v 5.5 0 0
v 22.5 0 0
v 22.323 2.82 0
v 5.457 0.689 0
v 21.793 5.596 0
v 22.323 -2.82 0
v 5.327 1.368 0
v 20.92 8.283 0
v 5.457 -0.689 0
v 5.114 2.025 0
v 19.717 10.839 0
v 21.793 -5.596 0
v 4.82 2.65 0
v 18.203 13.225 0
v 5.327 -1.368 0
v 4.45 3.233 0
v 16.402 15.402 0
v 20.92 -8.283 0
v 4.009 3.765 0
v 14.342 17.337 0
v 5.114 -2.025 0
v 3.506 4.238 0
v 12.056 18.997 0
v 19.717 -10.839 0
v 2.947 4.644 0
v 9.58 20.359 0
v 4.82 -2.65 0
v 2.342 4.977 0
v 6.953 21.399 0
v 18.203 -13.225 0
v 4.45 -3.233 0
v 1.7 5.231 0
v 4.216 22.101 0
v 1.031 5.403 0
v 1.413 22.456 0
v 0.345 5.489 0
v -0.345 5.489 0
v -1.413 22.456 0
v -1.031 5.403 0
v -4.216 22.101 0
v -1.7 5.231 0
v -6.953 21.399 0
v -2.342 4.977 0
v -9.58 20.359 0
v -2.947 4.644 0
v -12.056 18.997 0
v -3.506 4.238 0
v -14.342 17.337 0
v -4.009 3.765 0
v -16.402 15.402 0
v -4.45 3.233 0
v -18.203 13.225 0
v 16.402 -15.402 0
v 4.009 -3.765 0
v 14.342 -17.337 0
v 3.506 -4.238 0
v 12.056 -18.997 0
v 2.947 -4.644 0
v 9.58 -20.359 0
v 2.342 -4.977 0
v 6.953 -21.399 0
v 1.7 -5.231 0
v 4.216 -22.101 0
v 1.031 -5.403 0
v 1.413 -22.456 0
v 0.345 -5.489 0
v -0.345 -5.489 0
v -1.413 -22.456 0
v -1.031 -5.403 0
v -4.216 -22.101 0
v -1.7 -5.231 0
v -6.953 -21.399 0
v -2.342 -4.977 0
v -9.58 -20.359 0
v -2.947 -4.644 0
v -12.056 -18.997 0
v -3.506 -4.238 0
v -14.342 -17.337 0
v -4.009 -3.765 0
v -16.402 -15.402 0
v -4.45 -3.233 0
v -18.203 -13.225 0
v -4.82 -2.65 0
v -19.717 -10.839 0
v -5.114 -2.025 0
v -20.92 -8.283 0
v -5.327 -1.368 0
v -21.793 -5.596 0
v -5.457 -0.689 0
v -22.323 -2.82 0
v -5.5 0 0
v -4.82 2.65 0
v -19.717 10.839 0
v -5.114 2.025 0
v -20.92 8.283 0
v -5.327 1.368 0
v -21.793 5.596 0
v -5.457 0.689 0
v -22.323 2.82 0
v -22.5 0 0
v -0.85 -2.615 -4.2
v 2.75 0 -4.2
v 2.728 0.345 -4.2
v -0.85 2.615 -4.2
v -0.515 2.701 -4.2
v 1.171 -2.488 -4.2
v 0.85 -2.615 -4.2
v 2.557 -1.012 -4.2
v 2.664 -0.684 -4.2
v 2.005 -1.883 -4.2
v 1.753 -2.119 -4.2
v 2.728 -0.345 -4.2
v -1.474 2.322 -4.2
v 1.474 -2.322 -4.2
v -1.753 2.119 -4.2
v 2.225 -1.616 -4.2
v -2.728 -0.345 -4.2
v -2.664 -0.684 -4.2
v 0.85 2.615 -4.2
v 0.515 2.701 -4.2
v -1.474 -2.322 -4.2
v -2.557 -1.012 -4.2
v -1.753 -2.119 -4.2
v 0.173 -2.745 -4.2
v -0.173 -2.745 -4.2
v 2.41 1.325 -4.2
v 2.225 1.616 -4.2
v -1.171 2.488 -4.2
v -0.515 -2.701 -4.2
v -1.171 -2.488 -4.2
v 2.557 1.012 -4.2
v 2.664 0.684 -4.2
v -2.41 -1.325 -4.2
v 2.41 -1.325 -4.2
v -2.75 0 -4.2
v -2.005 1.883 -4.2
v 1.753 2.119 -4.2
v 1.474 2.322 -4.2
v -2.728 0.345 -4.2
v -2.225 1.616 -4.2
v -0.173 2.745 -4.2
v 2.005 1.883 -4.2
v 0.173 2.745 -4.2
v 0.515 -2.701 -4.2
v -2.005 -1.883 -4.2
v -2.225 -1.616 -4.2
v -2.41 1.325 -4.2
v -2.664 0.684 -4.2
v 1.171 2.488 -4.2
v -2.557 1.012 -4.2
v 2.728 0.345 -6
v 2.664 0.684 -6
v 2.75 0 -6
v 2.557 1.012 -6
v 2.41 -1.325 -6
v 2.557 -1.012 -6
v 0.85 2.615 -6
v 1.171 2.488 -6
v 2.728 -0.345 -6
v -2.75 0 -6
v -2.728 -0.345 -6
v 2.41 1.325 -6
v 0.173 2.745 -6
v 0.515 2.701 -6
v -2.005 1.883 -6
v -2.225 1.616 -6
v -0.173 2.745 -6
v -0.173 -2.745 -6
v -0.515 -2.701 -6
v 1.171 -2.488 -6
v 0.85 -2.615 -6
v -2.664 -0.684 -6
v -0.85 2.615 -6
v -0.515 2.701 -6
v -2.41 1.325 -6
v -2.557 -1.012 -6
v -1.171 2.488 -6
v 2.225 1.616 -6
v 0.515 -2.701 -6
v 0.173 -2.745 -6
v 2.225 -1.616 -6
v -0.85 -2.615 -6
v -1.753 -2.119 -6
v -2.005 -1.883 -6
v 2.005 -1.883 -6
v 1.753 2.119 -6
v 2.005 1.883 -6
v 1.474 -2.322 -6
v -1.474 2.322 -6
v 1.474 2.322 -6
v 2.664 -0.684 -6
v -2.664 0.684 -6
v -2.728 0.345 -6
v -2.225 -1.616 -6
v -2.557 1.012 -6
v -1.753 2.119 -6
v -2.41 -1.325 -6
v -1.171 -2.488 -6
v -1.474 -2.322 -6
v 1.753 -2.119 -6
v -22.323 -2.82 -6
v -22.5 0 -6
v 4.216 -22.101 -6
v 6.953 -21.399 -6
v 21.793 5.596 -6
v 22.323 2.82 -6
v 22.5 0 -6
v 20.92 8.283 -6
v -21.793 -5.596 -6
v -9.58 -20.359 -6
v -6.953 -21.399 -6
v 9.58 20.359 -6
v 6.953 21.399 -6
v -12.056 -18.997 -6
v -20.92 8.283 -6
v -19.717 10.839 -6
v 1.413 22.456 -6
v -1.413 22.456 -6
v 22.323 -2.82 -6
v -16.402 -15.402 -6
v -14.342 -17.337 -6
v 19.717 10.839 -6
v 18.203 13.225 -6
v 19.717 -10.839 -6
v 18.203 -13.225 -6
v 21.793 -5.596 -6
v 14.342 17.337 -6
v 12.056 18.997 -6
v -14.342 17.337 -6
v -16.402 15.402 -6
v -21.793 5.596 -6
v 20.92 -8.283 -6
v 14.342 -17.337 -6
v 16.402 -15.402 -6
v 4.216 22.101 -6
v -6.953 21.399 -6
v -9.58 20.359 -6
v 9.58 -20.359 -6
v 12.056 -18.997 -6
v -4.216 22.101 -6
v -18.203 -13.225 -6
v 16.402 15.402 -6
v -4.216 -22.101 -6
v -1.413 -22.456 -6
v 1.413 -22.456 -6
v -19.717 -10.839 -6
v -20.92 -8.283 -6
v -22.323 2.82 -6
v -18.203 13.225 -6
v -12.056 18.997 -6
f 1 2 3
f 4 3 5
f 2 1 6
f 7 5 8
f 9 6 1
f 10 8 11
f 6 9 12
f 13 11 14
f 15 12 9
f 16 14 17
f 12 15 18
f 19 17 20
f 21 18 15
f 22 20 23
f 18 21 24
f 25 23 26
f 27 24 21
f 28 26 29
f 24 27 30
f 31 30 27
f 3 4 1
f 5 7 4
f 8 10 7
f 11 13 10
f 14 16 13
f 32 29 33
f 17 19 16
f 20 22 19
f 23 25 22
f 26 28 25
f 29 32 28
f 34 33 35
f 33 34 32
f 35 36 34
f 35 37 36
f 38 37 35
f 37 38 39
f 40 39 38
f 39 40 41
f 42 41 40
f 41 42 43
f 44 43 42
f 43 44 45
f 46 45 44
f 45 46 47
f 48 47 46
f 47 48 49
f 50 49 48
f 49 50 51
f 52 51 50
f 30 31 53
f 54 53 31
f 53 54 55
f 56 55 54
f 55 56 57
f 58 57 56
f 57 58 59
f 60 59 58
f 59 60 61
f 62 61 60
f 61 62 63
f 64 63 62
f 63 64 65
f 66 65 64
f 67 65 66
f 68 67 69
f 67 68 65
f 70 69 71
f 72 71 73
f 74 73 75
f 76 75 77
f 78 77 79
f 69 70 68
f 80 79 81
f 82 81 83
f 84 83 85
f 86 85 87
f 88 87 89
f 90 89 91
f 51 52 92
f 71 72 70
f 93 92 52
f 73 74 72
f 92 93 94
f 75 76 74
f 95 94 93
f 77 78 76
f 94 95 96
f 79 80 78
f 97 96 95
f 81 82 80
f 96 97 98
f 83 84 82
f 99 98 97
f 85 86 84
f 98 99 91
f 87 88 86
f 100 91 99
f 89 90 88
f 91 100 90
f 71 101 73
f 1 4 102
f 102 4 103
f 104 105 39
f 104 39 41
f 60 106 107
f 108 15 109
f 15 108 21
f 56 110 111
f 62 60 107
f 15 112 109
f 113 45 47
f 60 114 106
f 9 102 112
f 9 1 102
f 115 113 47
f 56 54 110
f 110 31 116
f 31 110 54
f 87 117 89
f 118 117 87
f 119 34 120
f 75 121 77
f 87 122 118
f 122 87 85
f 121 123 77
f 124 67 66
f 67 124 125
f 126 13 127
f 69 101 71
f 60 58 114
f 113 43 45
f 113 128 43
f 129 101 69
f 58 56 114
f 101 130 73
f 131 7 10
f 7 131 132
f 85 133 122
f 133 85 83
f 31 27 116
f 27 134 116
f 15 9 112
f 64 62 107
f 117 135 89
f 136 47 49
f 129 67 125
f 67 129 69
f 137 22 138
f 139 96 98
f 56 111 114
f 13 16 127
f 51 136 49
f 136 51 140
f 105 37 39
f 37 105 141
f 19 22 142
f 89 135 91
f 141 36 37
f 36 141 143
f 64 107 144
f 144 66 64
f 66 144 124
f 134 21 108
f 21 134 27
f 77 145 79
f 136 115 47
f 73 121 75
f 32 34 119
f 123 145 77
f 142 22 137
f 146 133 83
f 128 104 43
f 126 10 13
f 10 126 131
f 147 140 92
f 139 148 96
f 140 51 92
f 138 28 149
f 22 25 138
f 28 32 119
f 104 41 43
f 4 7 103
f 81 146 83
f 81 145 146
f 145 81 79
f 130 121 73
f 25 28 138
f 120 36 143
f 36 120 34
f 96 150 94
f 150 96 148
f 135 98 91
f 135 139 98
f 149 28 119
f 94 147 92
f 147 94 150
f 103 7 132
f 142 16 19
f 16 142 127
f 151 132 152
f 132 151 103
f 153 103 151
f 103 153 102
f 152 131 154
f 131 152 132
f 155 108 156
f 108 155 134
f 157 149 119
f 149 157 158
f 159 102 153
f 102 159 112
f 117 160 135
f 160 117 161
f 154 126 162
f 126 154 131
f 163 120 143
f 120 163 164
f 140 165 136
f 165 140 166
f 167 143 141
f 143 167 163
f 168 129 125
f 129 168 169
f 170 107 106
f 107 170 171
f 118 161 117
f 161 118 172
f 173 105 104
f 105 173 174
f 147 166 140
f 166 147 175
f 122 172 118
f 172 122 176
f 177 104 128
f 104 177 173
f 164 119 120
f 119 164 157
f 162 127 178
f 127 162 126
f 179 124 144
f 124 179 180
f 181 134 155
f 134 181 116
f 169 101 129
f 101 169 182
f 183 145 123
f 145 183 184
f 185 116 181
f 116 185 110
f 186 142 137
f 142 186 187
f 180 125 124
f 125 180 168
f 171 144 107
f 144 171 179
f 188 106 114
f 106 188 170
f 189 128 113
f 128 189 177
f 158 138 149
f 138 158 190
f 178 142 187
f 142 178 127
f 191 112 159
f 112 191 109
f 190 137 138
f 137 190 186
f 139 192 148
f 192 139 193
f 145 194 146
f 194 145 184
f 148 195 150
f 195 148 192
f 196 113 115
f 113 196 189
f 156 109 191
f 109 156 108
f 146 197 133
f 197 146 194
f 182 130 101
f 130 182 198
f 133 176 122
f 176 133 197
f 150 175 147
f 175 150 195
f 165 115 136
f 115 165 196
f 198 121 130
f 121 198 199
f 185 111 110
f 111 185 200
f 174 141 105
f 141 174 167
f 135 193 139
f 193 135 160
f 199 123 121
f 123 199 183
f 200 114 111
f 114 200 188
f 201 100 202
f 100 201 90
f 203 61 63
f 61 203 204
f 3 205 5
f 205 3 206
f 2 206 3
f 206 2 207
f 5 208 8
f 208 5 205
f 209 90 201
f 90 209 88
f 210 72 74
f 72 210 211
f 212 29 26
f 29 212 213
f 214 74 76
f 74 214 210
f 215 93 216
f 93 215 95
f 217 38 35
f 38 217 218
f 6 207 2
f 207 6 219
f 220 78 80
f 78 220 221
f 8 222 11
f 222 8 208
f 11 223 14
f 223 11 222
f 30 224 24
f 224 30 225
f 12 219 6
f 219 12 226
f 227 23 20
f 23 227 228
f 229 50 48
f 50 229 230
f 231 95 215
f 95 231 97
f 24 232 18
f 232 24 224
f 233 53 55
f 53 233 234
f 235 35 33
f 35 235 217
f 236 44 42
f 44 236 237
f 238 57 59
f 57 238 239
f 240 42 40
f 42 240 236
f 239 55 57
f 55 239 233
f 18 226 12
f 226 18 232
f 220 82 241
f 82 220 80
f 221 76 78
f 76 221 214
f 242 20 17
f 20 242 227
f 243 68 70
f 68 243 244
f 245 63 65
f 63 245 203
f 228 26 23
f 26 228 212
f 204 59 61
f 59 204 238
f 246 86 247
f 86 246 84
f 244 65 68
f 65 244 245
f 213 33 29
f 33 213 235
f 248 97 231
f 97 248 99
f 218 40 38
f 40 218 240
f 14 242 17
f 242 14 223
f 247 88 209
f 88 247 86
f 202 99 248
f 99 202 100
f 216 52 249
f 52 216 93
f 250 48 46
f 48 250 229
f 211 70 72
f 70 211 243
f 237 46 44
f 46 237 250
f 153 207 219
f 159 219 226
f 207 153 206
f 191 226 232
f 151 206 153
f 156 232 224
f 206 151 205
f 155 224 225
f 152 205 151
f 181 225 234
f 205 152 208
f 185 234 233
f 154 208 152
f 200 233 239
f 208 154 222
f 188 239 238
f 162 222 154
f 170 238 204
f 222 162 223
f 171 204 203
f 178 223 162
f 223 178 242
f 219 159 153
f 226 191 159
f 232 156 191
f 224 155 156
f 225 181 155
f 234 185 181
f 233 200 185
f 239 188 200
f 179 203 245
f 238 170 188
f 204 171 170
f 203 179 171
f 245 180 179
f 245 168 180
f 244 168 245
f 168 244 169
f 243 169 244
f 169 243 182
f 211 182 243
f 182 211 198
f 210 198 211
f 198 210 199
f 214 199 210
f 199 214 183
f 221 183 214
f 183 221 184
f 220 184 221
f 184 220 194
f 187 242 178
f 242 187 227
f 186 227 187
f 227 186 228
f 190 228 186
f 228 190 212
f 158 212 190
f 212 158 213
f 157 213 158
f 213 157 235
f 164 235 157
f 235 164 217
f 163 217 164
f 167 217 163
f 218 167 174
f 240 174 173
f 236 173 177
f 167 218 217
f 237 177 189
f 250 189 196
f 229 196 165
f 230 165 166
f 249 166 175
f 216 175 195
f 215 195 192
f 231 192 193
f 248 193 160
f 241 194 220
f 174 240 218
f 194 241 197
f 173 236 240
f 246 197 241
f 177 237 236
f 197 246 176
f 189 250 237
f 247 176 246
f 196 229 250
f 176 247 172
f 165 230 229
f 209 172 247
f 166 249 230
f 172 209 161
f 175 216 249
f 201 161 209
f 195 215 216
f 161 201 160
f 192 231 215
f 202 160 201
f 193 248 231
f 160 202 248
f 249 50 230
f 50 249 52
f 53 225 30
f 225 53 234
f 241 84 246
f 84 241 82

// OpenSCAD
$fn = 50;

difference() {
	union() {
		translate(v = [0, 0, -6.0]) {
			cylinder(h = 6, r = 22.5);
		}
	}
	union() {
		translate(v = [0, 0, 0]) {
			rotate(a = [0, 0, 0]) {
				difference() {
					union() {
						translate(v = [0, 0, -9.0]) {
							cylinder(h = 9, r = 2.25);
						}
						translate(v = [0, 0, -4.2]) {
							cylinder(h = 4.2, r1 = 2.75, r2 = 5.5);
						}
						translate(v = [0, 0, -9.0]) {
							cylinder(h = 9, r = 2.75);
						}
						translate(v = [0, 0, -9.0]) {
							cylinder(h = 9, r = 2.25);
						}
					}
					union();
				}
			}
		}
	}
}
